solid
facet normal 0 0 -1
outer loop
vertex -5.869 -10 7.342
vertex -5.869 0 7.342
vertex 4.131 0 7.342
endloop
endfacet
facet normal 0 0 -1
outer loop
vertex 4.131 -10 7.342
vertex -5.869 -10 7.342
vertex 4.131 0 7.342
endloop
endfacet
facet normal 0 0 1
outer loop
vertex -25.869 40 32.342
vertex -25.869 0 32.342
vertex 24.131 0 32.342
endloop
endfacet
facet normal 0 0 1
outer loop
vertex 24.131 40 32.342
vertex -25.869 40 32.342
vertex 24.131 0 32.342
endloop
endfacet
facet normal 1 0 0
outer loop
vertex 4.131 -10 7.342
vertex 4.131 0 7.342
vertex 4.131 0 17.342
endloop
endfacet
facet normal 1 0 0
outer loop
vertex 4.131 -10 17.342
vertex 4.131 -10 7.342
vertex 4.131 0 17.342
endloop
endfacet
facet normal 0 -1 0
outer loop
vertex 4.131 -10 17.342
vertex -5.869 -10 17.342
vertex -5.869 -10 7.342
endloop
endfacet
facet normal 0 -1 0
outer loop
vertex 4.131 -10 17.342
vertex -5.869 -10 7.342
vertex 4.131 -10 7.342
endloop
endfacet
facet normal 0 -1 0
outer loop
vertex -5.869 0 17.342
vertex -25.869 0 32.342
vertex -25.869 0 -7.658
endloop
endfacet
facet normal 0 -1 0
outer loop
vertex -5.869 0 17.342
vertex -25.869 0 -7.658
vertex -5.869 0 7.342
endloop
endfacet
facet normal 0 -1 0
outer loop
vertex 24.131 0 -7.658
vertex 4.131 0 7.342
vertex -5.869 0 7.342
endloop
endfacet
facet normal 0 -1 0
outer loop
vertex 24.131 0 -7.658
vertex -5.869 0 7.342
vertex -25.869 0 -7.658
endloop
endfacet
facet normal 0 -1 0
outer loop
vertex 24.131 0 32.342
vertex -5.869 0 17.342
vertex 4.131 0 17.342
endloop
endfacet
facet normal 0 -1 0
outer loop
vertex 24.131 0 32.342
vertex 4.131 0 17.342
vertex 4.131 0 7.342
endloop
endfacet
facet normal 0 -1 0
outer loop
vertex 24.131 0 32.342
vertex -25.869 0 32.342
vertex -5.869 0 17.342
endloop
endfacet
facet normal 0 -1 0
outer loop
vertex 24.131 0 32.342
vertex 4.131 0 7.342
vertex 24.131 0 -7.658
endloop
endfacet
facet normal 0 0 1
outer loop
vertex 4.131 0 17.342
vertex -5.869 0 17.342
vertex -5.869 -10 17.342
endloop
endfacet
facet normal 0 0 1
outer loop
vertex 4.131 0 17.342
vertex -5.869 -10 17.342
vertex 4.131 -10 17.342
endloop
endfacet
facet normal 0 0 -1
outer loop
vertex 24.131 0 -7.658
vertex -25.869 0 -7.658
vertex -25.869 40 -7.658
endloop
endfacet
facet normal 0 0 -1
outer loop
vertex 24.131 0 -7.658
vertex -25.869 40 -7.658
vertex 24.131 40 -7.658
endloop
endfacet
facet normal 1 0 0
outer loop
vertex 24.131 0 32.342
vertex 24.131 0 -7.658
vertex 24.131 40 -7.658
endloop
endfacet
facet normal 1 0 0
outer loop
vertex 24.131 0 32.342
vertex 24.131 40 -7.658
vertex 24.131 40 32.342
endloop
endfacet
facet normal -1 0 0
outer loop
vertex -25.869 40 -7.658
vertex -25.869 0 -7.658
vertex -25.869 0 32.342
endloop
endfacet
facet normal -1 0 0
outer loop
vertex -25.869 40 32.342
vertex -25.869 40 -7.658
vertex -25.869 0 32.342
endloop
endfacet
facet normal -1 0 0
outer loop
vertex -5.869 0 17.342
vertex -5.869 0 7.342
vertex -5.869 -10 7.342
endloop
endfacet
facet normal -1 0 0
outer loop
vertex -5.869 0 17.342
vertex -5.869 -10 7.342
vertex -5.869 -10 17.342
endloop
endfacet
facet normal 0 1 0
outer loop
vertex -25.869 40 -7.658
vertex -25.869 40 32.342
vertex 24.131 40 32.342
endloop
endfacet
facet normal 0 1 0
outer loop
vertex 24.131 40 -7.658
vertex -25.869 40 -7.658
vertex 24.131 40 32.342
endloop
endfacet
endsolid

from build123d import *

# Parameters (mm, degrees)
F0_W     = 50
F0_H     = 40
F0_W_2   = 10
F0_H_2   = 10
F1_DEPTH = 40
F4_DEPTH = 10


with BuildPart() as f1:
    # F0 (on Front) → F1 (new body)
    with BuildSketch(Plane.XZ):
        with Locations((-0.869263, 12.341743)):
            Rectangle(F0_W, F0_H)
        with Locations((-0.869263, 12.341743)):
            Rectangle(F0_W_2, F0_H_2, mode=Mode.SUBTRACT)
        with Locations((-0.869263, 12.341743)):
            Rectangle(F0_W_2, F0_H_2)
    extrude(amount=-F1_DEPTH)

    # F0 (on Front) → F4 (join)
    with BuildSketch(Plane.XZ):
        with Locations((-0.869263, 12.341743)):
            Rectangle(F0_W_2, F0_H_2)
    extrude(amount=F4_DEPTH)


solid = f1.part
